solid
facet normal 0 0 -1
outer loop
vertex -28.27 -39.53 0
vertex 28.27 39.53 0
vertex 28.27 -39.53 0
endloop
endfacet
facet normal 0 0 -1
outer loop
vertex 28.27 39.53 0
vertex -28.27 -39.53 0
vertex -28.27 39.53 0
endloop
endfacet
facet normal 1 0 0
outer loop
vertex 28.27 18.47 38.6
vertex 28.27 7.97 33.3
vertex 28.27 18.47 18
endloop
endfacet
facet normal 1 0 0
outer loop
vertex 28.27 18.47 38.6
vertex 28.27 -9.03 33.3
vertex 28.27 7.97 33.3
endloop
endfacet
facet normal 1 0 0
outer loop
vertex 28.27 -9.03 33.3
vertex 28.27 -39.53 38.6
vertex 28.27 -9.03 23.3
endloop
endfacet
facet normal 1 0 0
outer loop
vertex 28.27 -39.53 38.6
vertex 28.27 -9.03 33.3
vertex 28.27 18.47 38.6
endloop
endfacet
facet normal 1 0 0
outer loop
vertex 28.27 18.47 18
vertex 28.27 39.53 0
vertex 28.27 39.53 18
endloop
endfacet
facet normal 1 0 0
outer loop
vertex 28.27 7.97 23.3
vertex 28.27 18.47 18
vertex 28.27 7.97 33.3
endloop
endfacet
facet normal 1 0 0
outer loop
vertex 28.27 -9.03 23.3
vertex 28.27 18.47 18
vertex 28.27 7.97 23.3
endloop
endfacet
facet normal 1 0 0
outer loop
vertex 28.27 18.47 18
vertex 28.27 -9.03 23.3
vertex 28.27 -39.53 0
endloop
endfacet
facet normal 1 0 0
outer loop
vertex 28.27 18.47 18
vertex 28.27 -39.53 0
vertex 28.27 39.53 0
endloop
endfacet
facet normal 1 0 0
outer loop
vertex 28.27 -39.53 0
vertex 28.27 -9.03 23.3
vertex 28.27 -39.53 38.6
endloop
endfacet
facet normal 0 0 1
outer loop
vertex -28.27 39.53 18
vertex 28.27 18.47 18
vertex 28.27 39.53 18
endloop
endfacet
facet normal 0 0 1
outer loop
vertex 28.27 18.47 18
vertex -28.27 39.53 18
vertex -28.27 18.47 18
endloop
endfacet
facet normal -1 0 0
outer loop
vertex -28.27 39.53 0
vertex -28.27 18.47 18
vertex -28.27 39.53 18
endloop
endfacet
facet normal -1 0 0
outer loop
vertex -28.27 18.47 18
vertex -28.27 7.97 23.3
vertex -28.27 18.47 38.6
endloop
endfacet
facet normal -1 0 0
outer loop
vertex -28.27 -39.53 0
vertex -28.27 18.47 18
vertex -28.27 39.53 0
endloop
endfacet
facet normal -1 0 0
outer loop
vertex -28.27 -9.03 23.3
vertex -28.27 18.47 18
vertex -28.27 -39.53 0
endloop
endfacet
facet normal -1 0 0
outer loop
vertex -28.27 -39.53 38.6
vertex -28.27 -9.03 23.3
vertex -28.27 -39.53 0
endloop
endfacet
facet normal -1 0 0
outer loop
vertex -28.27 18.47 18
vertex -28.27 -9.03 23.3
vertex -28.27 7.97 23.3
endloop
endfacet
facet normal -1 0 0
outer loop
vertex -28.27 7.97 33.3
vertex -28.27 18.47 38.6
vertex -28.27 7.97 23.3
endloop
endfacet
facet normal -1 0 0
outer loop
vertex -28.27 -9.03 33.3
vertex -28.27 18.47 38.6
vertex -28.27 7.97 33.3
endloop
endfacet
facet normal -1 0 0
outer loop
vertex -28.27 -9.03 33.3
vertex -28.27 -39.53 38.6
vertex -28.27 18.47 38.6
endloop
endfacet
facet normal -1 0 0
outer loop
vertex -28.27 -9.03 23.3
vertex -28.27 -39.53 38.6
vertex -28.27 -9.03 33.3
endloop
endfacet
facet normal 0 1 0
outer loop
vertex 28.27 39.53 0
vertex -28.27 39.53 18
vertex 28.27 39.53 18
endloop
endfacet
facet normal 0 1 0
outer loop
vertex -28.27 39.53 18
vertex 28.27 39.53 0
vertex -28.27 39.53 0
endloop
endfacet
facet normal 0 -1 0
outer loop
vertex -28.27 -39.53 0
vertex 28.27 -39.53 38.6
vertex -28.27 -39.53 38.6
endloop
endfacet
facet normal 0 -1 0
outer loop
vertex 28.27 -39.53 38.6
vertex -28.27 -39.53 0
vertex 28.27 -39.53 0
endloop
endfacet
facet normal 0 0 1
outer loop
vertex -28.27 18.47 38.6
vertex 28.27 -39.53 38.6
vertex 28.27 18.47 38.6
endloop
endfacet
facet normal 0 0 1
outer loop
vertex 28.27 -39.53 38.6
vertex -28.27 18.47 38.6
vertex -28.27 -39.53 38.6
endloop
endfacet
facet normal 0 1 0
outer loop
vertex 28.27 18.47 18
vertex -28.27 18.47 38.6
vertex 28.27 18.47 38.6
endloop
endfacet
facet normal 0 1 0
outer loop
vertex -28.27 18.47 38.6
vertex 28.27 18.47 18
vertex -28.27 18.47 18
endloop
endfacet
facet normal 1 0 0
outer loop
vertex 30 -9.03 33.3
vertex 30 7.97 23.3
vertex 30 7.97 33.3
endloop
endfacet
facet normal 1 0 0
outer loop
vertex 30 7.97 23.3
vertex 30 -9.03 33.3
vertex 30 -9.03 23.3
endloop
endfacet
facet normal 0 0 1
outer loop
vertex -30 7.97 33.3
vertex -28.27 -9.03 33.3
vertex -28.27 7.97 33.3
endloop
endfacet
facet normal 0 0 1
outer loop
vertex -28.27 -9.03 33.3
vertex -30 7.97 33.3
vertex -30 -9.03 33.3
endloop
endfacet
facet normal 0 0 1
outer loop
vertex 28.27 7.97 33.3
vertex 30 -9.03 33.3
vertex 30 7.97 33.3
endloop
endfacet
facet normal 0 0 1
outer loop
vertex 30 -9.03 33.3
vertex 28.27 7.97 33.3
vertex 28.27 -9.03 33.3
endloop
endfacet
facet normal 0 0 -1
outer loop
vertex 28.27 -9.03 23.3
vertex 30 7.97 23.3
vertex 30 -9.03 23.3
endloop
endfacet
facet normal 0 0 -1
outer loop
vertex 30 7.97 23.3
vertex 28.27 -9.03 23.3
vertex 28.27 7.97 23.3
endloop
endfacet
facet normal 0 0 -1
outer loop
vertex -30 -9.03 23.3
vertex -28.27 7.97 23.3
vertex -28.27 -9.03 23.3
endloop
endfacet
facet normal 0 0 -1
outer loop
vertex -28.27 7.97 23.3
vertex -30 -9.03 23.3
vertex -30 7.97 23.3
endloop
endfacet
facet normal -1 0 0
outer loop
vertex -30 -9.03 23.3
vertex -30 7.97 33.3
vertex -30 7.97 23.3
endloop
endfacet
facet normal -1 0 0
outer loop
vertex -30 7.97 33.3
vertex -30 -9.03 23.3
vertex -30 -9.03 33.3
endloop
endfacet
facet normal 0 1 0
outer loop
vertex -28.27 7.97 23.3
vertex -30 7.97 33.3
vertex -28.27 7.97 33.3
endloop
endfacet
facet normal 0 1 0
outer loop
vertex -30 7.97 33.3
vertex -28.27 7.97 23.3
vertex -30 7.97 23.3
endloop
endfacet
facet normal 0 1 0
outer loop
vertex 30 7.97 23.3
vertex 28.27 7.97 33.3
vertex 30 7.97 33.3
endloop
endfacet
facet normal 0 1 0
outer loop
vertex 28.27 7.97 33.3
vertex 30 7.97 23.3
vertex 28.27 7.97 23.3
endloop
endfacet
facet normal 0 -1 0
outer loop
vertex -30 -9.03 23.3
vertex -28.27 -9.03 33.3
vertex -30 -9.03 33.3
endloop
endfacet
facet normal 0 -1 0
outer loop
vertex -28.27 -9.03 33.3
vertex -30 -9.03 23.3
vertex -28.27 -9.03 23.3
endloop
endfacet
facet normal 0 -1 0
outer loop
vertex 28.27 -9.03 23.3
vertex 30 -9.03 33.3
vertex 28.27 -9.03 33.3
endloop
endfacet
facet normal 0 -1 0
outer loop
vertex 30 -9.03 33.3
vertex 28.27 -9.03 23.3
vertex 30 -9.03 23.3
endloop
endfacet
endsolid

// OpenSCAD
// file: air-quality-monitor-params.scad
// Air Quality Monitor shared parameters (mm)
$fn = 64;

// Display module dimensions (Waveshare 2.8" ESP32-S3)
tp_w = 50.54;
tp_h = 73.06;
tp_corner_rad = 2.0;
tp_stack_thk = 3.6;
touch_visible_w = 43.80;
touch_visible_h = 58.20;
lcd_active_w = 43.20;
lcd_active_h = 57.60;

// Display PCB
pcb_w = 49.90;
pcb_h = 69.00;
board_top_offset = (tp_h - pcb_h) / 2;
board_side_offset = (tp_w - pcb_w) / 2;
mount_hole_spacing_x = 41.00;
mount_hole_spacing_y = 60.00;

// Fasteners
screw_d = 2.5;          // M2.5
screw_clear_d = 2.7;
boss_wall = 1.2;
boss_od = screw_d + 2 * boss_wall;
standoff_h = 4.0;

// Enclosure shell
wall_thk = 2.0;
face_thk = 2.0;
bezel_margin = 3.0;
front_shell_w = tp_w + 2 * bezel_margin;
front_shell_h = tp_h + 2 * bezel_margin;
front_shell_rad = tp_corner_rad + bezel_margin;
front_shell_d = 18.0;
front_tilt_deg = 70;    // 20 deg off vertical
outer_edge_rad = 3.0;
rear_pod_h = 58.0;
rear_pod_rad = front_shell_rad;
divider_thk = 2.0;

// Display window
window_clear = 0.4;
window_w = touch_visible_w + 2 * window_clear;
window_h = touch_visible_h + 2 * window_clear;
window_rad = 1.2;
window_offset_y = 2.0;  // positive moves window up

// Face details
pinhole_d = 1.2;
pinhole_offset_y = 4.0; // distance from top edge

// Right-side buttons
button_count = 3;
button_hole_d = 2.6;
button_hole_len = 4.0;
button_top_offset_board = 7.84;
button_pitch = 7.82;
button_edge_offset_board = 0.0;

// Front vent (single slot)
front_vent_slot_w = 36.0;
front_vent_slot_h = 2.0;
front_vent_offset_y = 6.0; // distance from bottom edge to slot center

// Sensor vents (main body bottom)
sensor_vent_slot_w = 18.0;
sensor_vent_slot_h = 2.0;
sensor_vent_slot_gap = 2.0;
sensor_vent_slot_count = 2;
sensor_vent_offset_y = 6.0;

// Display rear cover vent (single slot)
display_lid_vent_slot_w = 18.0;
display_lid_vent_slot_h = 2.0;
display_lid_vent_offset_y = 6.0;

// Sensors
sps30_body_w = 41.0;
sps30_body_h = 41.0;
sps30_body_d = 12.0;
sps30_mount_clear = 0.6;
sps30_adhesive_thk = 0.5;

scd40_board_w = 60.0;
scd40_board_h = 17.0;
scd40_board_d = 10.0;
scd40_mount_clear = 0.6;

// Battery
batt_w = 51.0;
batt_h = 40.0;
batt_d = 10.0;
batt_clear = 0.6;
batt_cable_clear = 3.0;

// Rear pod depth (fit sensors + wiring)
wiring_clear = 4.0;
sensor_door_thk = 2.0;
rear_pod_d = max(
  sps30_body_d + sps30_mount_clear + wiring_clear + sensor_door_thk + 2.0,
  scd40_board_d + scd40_mount_clear + wiring_clear + sensor_door_thk + 2.0
);

// Sensor rear cover (slide-in)
rear_slide_clear = 0.30;
rear_rail_thk = 1.6;
rear_detent_h = 0.6;
rear_notch_w = 8.0;
rear_notch_h = 3.0;

// USB-C extension opening
usb_c_open_w = 9.0;
usb_c_open_h = 4.0;
usb_c_open_r = 1.0;
usb_c_open_offset_y = 0.0;

// Rear grille (sensor door)
rear_grille_recess_depth = 1.0;
rear_grille_margin = 6.0;
rear_grille_slot_w = front_shell_w - 2 * rear_grille_margin;
rear_grille_slot_h = 2.0;
rear_grille_slot_gap = 1.5;
rear_grille_slot_count = 7;

// Feet
foot_d = 6.0;
foot_h = 1.5;
foot_inset_x = 6.0;
foot_inset_y = 6.0;
// main file
// Air Quality Monitor layout scene (bounding boxes + front overlay)
include <air-quality-monitor-params.scad>;

show_front_overlay = true;
show_layout_boxes = true;

module rounded_rect_2d(w, h, r) {
  offset(r = r) square([w - 2 * r, h - 2 * r], center = true);
}

module front_overlay_2d() {
  // Front face outline
  linear_extrude(height = 1)
    rounded_rect_2d(front_shell_w, front_shell_h, front_shell_rad);

  // Display window outline
  translate([0, window_offset_y, 0])
    linear_extrude(height = 1)
      rounded_rect_2d(window_w, window_h, window_rad);

  // Front vent slot (single)
  translate([0, -front_shell_h / 2 + front_vent_offset_y, 0])
    linear_extrude(height = 1)
      square([front_vent_slot_w, front_vent_slot_h], center = true);

  // Pinhole
  translate([0, front_shell_h / 2 - pinhole_offset_y, 0])
    linear_extrude(height = 1)
      circle(d = pinhole_d);
}

module layout_boxes() {
  // Front housing volume (approx)
  color([0.8, 0.8, 0.8, 0.4])
    translate([0, 0, front_shell_d / 2])
      cube([front_shell_w, front_shell_h, front_shell_d], center = true);

  // Rear pod volume (approx)
  color([0.7, 0.7, 0.7, 0.4])
    translate([0, -((front_shell_h - rear_pod_h) / 2), front_shell_d + rear_pod_d / 2])
      cube([front_shell_w, rear_pod_h, rear_pod_d], center = true);

  // Display PCB bounding box
  color([0.2, 0.6, 0.9, 0.5])
    translate([0, 0, face_thk + tp_stack_thk / 2])
      cube([pcb_w, pcb_h, tp_stack_thk], center = true);

  // SPS30 bounding box
  color([0.9, 0.6, 0.2, 0.6])
    translate([0, -((front_shell_h - rear_pod_h) / 2), front_shell_d + rear_pod_d / 2])
      cube([sps30_body_w, sps30_body_h, sps30_body_d], center = true);

  // SCD40 bounding box
  color([0.3, 0.8, 0.4, 0.6])
    translate([0, -((front_shell_h - rear_pod_h) / 2) + 10, front_shell_d + rear_pod_d / 2])
      cube([scd40_board_w, scd40_board_h, scd40_board_d], center = true);

  // Battery bounding box (display cover)
  color([0.7, 0.4, 0.8, 0.5])
    translate([0, 0, face_thk + tp_stack_thk + batt_d / 2 + 2])
      cube([batt_w, batt_h, batt_d], center = true);
}

if (show_front_overlay) {
  front_overlay_2d();
}

if (show_layout_boxes) {
  layout_boxes();
}
